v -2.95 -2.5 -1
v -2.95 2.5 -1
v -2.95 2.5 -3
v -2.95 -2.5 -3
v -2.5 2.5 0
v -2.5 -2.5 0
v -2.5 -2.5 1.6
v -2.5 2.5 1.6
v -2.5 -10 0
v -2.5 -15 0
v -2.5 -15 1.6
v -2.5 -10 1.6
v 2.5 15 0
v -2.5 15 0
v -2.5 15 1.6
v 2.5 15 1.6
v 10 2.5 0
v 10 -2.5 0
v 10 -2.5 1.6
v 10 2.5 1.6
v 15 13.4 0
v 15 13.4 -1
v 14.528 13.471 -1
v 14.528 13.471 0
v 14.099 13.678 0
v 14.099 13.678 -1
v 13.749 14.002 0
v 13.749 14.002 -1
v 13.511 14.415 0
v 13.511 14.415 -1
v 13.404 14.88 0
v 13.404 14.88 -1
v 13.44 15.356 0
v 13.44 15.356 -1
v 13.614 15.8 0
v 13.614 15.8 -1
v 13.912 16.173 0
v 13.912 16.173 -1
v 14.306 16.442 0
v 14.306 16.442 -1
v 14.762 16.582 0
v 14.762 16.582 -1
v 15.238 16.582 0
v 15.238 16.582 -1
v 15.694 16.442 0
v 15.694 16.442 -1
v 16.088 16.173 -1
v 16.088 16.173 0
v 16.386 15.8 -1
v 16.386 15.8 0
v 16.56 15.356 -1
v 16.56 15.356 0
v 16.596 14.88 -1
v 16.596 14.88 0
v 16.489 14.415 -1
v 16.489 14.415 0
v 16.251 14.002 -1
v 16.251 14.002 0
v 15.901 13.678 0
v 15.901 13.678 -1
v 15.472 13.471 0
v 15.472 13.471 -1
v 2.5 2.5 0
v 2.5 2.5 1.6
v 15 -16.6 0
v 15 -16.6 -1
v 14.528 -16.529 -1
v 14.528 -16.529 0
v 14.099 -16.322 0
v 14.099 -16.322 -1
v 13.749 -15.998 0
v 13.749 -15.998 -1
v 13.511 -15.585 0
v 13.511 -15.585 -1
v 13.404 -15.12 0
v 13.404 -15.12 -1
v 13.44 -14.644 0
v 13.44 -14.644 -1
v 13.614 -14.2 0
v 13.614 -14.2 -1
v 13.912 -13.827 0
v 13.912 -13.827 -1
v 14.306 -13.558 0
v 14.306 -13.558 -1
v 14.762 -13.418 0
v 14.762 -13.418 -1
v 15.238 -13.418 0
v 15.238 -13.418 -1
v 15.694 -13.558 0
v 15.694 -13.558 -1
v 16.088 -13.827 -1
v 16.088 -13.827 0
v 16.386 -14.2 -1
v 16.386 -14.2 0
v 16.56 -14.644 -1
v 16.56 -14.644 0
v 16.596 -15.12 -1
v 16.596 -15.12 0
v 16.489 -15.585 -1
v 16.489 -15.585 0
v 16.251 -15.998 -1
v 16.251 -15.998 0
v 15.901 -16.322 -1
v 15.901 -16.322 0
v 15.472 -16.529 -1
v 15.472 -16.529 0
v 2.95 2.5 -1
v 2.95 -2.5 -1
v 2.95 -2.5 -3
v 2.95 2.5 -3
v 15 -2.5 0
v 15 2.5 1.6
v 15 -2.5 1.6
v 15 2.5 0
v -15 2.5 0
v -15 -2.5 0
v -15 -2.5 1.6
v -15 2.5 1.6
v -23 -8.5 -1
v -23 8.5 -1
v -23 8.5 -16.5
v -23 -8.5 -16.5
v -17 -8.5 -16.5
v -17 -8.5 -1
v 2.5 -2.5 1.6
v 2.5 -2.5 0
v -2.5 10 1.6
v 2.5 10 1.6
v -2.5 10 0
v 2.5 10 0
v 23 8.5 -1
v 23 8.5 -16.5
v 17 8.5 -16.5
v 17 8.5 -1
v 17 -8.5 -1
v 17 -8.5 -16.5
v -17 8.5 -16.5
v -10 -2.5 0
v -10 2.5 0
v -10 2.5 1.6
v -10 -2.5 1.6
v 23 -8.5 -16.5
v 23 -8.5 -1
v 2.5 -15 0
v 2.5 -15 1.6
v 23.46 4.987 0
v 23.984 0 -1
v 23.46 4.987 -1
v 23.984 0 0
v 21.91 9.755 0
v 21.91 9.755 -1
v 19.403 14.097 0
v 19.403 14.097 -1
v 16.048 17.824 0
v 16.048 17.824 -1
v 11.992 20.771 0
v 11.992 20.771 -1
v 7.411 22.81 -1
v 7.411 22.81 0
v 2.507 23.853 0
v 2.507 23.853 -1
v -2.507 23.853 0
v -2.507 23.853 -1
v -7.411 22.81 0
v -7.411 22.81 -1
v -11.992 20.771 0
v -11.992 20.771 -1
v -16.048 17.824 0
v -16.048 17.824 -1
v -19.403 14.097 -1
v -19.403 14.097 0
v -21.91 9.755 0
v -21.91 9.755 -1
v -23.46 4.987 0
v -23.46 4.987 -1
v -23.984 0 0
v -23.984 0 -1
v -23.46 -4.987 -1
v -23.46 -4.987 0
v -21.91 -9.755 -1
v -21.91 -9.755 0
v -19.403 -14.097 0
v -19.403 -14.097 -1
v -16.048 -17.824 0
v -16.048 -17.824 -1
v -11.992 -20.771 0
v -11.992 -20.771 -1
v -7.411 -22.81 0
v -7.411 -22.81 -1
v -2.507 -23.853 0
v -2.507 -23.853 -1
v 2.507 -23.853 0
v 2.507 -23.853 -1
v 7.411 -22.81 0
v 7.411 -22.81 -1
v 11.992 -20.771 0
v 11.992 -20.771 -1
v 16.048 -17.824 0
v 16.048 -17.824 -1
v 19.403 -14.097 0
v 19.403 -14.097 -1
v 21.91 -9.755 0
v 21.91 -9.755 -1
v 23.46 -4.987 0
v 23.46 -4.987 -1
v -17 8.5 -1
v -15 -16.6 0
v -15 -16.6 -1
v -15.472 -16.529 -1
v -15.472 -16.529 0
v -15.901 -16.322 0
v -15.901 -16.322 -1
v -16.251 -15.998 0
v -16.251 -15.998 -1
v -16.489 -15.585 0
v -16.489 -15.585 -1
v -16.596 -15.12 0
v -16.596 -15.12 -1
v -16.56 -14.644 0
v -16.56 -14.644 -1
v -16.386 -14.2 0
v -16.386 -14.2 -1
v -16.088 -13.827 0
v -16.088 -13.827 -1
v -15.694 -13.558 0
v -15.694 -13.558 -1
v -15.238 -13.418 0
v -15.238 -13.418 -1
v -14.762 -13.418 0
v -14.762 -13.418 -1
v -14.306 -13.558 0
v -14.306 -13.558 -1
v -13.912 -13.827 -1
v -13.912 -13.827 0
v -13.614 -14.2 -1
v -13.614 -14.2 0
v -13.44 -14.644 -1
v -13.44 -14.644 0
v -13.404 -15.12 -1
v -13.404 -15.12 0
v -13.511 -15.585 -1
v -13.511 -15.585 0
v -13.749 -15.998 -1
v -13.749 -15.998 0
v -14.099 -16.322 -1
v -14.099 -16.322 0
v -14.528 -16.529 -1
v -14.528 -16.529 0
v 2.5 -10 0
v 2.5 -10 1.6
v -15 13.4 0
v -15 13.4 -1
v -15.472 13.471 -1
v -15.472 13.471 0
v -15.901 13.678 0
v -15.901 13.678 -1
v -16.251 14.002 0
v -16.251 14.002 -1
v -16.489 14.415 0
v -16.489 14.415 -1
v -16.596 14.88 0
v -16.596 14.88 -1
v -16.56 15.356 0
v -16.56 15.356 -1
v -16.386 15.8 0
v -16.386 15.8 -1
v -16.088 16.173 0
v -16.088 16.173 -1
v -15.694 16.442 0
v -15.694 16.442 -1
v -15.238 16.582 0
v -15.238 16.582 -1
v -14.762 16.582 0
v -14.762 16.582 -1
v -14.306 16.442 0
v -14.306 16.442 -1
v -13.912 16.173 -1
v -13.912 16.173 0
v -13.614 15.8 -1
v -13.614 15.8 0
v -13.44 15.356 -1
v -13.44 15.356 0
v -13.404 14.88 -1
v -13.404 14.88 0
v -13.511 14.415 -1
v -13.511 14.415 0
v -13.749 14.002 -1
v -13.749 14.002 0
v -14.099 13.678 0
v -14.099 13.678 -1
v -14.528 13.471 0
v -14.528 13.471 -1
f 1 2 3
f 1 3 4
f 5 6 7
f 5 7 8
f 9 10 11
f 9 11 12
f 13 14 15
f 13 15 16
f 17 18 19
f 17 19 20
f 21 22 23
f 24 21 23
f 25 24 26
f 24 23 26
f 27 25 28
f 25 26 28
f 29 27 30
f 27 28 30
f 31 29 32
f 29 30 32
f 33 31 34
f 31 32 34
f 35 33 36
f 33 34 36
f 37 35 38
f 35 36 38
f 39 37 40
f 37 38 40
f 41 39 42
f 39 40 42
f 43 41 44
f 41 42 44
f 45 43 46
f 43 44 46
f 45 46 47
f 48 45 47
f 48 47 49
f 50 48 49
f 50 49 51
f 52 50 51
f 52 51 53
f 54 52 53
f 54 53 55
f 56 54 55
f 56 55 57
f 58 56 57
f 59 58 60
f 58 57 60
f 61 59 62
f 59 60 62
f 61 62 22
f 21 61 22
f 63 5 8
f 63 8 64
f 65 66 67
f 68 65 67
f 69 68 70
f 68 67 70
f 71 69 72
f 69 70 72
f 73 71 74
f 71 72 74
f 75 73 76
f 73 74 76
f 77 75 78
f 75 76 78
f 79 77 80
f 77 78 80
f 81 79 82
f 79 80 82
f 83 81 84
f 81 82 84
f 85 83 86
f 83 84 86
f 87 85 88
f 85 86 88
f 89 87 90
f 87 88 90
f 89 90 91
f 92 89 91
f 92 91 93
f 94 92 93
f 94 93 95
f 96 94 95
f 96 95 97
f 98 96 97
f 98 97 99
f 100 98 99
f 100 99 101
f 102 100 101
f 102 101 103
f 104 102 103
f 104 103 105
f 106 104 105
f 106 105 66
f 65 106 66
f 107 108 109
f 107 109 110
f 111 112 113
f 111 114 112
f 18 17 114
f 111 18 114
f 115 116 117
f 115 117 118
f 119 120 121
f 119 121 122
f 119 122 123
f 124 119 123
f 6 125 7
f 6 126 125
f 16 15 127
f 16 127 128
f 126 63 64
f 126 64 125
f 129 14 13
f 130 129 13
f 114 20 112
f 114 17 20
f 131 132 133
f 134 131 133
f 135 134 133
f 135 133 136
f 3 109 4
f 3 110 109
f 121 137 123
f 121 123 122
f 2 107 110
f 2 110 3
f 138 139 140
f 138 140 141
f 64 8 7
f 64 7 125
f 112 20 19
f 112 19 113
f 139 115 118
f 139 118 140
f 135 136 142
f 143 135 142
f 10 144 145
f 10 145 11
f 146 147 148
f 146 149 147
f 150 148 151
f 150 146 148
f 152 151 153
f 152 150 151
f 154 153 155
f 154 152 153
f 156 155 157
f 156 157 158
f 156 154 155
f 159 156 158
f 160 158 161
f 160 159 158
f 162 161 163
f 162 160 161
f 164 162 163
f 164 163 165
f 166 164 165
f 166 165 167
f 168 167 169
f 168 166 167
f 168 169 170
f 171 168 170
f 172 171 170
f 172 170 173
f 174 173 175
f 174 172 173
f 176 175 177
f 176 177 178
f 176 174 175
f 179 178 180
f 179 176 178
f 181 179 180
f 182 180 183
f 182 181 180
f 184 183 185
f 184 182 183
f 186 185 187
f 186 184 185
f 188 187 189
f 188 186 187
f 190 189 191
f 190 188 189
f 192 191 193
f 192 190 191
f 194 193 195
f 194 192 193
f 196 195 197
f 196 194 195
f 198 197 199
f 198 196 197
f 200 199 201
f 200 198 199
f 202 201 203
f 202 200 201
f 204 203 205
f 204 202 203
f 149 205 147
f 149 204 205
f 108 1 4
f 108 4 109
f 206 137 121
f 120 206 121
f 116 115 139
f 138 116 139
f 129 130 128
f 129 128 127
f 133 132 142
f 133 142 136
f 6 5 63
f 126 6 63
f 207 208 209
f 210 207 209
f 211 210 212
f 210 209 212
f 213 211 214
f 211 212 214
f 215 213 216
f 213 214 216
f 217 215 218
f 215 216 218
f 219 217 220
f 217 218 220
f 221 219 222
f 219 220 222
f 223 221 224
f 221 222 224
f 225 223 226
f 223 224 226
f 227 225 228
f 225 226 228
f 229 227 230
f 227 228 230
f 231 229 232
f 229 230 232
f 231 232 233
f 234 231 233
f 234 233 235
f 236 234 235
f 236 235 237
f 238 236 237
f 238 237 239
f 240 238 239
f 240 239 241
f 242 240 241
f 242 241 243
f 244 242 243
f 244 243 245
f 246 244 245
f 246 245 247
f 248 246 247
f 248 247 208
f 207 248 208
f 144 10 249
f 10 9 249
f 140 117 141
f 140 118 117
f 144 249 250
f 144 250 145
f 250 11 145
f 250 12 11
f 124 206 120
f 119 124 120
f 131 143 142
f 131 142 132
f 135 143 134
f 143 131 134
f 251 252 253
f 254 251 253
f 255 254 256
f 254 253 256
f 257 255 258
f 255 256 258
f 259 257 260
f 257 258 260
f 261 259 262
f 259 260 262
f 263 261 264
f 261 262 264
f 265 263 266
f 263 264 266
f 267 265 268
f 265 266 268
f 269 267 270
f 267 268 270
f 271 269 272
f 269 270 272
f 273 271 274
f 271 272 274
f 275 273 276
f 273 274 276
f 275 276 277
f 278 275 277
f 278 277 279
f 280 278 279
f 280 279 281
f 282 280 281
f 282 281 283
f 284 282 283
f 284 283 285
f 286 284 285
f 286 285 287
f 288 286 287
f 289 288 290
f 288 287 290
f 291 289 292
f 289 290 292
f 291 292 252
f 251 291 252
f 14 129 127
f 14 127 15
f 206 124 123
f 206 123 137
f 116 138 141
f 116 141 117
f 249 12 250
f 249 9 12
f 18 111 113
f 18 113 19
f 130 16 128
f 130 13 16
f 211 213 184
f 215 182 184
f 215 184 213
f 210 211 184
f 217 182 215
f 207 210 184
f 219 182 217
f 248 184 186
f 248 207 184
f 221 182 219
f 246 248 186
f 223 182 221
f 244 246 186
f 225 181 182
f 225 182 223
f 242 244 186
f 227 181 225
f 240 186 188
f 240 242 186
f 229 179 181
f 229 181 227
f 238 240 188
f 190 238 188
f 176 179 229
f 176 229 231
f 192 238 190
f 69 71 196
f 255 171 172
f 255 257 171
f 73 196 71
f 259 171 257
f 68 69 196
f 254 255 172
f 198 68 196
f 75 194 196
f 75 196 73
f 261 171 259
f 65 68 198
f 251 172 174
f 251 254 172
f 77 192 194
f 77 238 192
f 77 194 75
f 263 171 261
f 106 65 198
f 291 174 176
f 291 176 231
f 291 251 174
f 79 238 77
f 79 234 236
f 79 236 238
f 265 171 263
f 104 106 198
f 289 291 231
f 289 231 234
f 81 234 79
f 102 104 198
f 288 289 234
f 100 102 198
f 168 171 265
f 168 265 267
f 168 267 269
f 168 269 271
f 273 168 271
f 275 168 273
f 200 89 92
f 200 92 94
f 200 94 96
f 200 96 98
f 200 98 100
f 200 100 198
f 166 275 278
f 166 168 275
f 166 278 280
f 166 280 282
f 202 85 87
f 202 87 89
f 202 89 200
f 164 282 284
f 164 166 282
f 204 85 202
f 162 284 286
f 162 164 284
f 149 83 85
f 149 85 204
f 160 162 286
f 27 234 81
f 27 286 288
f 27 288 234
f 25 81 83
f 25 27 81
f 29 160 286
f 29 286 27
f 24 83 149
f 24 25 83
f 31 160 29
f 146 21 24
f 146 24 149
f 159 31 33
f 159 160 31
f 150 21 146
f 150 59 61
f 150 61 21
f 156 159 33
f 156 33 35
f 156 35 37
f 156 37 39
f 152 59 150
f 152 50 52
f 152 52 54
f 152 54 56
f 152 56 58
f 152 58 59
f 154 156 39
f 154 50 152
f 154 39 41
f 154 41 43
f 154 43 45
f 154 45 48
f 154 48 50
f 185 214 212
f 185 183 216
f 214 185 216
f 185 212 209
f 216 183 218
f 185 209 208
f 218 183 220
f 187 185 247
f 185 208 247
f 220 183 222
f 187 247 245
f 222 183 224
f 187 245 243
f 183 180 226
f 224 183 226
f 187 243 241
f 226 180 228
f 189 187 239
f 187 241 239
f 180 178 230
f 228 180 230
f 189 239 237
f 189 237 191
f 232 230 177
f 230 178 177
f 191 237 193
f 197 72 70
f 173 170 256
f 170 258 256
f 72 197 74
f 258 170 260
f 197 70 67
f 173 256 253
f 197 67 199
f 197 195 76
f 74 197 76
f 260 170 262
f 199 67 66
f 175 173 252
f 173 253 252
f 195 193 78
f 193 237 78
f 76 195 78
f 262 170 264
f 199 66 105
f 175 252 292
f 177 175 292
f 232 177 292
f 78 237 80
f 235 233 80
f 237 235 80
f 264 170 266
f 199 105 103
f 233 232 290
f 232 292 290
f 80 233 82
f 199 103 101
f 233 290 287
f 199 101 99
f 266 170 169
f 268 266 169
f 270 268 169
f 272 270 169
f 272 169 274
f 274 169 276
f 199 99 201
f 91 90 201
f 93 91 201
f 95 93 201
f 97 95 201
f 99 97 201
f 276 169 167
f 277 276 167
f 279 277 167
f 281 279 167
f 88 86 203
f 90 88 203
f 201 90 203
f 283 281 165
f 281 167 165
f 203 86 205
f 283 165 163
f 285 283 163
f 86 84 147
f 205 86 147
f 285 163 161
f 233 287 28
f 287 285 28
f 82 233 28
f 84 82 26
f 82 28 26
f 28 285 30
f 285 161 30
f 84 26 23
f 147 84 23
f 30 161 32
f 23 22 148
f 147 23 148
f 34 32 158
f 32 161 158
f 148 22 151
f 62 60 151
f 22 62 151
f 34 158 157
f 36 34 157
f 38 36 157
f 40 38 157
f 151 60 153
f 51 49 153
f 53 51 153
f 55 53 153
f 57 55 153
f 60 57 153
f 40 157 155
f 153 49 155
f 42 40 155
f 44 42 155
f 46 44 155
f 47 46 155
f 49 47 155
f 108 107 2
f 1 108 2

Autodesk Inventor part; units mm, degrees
ref_plane "YZ Plane" through (0, 0, 0) normal (1, 0, 0) x (0, 1, 0)
ref_plane "XZ Plane" through (0, 0, 0) normal (0, 1, 0) x (-1, 0, 0)
ref_plane "XY Plane" through (0, 0, 0) normal (0, 0, 1) x (1, 0, 0)
sketch "Skizze1" plane through (0, 0, 0) normal (0, 0, 1) x (1, 0, 0)
  circle A0 centre (0, 0) radius 25
  circle A1 centre (0, 0) radius 23.984
  circle A2 centre (0, 0) radius 21.2132 construction
  line L0 (-15, 15) -> (15, 15) construction
  line L1 (15, 15) -> (15, -15) construction
  line L2 (15, -15) -> (-15, -15) construction
  line L3 (-15, -15) -> (-15, 15) construction
  point P0 (15, 15)
  point P1 (15, -15)
  dimension "d0" = 50
  dimension "d1" = 1.016
  dimension "d2" = 30
extrude "Extrusion1" add sketch "Skizze1" against normal blind 1 contours A1
hole "Bohrung1" at (-15, 15, 0) at (15, 15, 0) at (15, -15, 0) at (-15, -15, 0) direction (0, 0, -1) diameter 3.2 end through all
sketch "Skizze2" plane through (0, 0, 0) normal (0, 0, 1) x (1, 0, 0)
  circle A0 centre (15, -15) radius 1.6 projected
  circle A1 centre (-15, 15) radius 1.6 projected
  circle A2 centre (15, 15) radius 1.6 projected
  circle A3 centre (-15, -15) radius 1.6 projected
  circle A4 centre (0, 0) radius 23.984 projected
  line L0 (-25.6213, 25.3721) -> (25.184, 25.3721) construction
  line L1 (25.184, 25.3721) -> (25.184, -25.4332) construction
  line L2 (25.184, -25.4332) -> (-25.6213, -25.4332) construction
  line L3 (-25.6213, -25.4332) -> (-25.6213, 25.3721) construction
sketch "Skizze3" plane through (0, 0, 0) normal (0, 0, 1) x (1, 0, 0)
  circle A0 centre (0, 0) radius 23.984 projected
  line L0 (-2.5, 2.5) -> (2.5, 2.5)
  line L1 (2.5, 2.5) -> (2.5, -2.5)
  line L2 (2.5, -2.5) -> (-2.5, -2.5)
  line L3 (-2.5, -2.5) -> (-2.5, 2.5)
  line L4 (-15, 2.5) -> (-10, 2.5)
  line L5 (-10, 2.5) -> (-10, -2.5)
  line L6 (-10, -2.5) -> (-15, -2.5)
  line L7 (-15, -2.5) -> (-15, 2.5)
  line L8 (-15, 2.5) -> (-10, -2.5) construction
  line L9 (-2.5, 2.5) -> (2.5, -2.5) construction
  line L10 (2.5, -2.5) -> (0, 0) construction
  line L11 (0, 0) -> (-12.5, 0) construction
  line L12 (-2.5, -15) -> (-2.5, -10)
  line L13 (-2.5, -10) -> (2.5, -10)
  line L14 (2.5, -10) -> (2.5, -15)
  line L15 (2.5, -15) -> (-2.5, -15)
  line L16 (15, -2.5) -> (10, -2.5)
  line L17 (10, -2.5) -> (10, 2.5)
  line L18 (10, 2.5) -> (15, 2.5)
  line L19 (15, 2.5) -> (15, -2.5)
  line L20 (2.5, 15) -> (2.5, 10)
  line L21 (2.5, 10) -> (-2.5, 10)
  line L22 (-2.5, 10) -> (-2.5, 15)
  line L23 (-2.5, 15) -> (2.5, 15)
  dimension "d24" = 5
  dimension "d25" = 12.5
  dimension "d28" = 360
extrude "Extrusion2" add sketch "Skizze3" along normal blind 1.6 separate body contours L0 L1 L2 L3 | L4 L5 L6 L7 | L12 L13 L14 L15 | L16 L17 L18 L19 | L20 L21 L22 L23
sketch "Skizze4" plane through (0, 0, -1) normal (0, 0, -1) x (-1, 0, 0)
  circle A0 centre (0, 0) radius 23.984 projected
  line L0 (-2.95, 2.5) -> (2.95, 2.5)
  line L1 (2.95, 2.5) -> (2.95, -2.5)
  line L2 (2.95, -2.5) -> (-2.95, -2.5)
  line L3 (-2.95, -2.5) -> (-2.95, 2.5)
  line L4 (-2.95, -2.5) -> (2.95, 2.5) construction
  dimension "d33" = 5.9
  dimension "d34" = 5
extrude "Extrusion3" add sketch "Skizze4" along normal blind 2 separate body contours L0 L1 L2 L3
sketch "Skizze5" plane through (0, 0, -1) normal (0, 0, -1) x (-1, 0, 0)
  circle A0 centre (0, 0) radius 23.984 projected
  line L0 (-23, 8.5) -> (-17, 8.5)
  line L1 (-17, 8.5) -> (-17, -8.5)
  line L2 (-17, -8.5) -> (-23, -8.5)
  line L3 (-23, -8.5) -> (-23, 8.5)
  line L4 (17, 8.5) -> (23, 8.5)
  line L5 (23, 8.5) -> (23, -8.5)
  line L6 (23, -8.5) -> (17, -8.5)
  line L7 (17, -8.5) -> (17, 8.5)
  line L8 (-23, 0) -> (23, 0) construction
  line L9 (-20, 8.5) -> (-20, -8.5) construction
  point P0 (0, 0)
  dimension "d38" = 17
  dimension "d39" = 6
  dimension "d40" = 20
extrude "Extrusion4" add sketch "Skizze5" along normal blind 15.5 contours L5 A0 L6 L7 L4 | A0 L4 L5 | L5 L6 A0 | L0 L1 L2 A0 L3 | A0 L3 L0 | L2 L3 A0 bodies 3
sketch "Skizze6" plane through (0, 0, -1) normal (0, 0, -1) x (-1, 0, 0)
  line L0 (-26.2075, 26.1914) -> (26.4628, 26.1914) construction
  line L1 (26.4628, 26.1914) -> (26.4628, -26.479) construction
  line L2 (26.4628, -26.479) -> (-26.2075, -26.479) construction
  line L3 (-26.2075, -26.479) -> (-26.2075, 26.1914) construction
properties part number "Encoder with LEDs"
